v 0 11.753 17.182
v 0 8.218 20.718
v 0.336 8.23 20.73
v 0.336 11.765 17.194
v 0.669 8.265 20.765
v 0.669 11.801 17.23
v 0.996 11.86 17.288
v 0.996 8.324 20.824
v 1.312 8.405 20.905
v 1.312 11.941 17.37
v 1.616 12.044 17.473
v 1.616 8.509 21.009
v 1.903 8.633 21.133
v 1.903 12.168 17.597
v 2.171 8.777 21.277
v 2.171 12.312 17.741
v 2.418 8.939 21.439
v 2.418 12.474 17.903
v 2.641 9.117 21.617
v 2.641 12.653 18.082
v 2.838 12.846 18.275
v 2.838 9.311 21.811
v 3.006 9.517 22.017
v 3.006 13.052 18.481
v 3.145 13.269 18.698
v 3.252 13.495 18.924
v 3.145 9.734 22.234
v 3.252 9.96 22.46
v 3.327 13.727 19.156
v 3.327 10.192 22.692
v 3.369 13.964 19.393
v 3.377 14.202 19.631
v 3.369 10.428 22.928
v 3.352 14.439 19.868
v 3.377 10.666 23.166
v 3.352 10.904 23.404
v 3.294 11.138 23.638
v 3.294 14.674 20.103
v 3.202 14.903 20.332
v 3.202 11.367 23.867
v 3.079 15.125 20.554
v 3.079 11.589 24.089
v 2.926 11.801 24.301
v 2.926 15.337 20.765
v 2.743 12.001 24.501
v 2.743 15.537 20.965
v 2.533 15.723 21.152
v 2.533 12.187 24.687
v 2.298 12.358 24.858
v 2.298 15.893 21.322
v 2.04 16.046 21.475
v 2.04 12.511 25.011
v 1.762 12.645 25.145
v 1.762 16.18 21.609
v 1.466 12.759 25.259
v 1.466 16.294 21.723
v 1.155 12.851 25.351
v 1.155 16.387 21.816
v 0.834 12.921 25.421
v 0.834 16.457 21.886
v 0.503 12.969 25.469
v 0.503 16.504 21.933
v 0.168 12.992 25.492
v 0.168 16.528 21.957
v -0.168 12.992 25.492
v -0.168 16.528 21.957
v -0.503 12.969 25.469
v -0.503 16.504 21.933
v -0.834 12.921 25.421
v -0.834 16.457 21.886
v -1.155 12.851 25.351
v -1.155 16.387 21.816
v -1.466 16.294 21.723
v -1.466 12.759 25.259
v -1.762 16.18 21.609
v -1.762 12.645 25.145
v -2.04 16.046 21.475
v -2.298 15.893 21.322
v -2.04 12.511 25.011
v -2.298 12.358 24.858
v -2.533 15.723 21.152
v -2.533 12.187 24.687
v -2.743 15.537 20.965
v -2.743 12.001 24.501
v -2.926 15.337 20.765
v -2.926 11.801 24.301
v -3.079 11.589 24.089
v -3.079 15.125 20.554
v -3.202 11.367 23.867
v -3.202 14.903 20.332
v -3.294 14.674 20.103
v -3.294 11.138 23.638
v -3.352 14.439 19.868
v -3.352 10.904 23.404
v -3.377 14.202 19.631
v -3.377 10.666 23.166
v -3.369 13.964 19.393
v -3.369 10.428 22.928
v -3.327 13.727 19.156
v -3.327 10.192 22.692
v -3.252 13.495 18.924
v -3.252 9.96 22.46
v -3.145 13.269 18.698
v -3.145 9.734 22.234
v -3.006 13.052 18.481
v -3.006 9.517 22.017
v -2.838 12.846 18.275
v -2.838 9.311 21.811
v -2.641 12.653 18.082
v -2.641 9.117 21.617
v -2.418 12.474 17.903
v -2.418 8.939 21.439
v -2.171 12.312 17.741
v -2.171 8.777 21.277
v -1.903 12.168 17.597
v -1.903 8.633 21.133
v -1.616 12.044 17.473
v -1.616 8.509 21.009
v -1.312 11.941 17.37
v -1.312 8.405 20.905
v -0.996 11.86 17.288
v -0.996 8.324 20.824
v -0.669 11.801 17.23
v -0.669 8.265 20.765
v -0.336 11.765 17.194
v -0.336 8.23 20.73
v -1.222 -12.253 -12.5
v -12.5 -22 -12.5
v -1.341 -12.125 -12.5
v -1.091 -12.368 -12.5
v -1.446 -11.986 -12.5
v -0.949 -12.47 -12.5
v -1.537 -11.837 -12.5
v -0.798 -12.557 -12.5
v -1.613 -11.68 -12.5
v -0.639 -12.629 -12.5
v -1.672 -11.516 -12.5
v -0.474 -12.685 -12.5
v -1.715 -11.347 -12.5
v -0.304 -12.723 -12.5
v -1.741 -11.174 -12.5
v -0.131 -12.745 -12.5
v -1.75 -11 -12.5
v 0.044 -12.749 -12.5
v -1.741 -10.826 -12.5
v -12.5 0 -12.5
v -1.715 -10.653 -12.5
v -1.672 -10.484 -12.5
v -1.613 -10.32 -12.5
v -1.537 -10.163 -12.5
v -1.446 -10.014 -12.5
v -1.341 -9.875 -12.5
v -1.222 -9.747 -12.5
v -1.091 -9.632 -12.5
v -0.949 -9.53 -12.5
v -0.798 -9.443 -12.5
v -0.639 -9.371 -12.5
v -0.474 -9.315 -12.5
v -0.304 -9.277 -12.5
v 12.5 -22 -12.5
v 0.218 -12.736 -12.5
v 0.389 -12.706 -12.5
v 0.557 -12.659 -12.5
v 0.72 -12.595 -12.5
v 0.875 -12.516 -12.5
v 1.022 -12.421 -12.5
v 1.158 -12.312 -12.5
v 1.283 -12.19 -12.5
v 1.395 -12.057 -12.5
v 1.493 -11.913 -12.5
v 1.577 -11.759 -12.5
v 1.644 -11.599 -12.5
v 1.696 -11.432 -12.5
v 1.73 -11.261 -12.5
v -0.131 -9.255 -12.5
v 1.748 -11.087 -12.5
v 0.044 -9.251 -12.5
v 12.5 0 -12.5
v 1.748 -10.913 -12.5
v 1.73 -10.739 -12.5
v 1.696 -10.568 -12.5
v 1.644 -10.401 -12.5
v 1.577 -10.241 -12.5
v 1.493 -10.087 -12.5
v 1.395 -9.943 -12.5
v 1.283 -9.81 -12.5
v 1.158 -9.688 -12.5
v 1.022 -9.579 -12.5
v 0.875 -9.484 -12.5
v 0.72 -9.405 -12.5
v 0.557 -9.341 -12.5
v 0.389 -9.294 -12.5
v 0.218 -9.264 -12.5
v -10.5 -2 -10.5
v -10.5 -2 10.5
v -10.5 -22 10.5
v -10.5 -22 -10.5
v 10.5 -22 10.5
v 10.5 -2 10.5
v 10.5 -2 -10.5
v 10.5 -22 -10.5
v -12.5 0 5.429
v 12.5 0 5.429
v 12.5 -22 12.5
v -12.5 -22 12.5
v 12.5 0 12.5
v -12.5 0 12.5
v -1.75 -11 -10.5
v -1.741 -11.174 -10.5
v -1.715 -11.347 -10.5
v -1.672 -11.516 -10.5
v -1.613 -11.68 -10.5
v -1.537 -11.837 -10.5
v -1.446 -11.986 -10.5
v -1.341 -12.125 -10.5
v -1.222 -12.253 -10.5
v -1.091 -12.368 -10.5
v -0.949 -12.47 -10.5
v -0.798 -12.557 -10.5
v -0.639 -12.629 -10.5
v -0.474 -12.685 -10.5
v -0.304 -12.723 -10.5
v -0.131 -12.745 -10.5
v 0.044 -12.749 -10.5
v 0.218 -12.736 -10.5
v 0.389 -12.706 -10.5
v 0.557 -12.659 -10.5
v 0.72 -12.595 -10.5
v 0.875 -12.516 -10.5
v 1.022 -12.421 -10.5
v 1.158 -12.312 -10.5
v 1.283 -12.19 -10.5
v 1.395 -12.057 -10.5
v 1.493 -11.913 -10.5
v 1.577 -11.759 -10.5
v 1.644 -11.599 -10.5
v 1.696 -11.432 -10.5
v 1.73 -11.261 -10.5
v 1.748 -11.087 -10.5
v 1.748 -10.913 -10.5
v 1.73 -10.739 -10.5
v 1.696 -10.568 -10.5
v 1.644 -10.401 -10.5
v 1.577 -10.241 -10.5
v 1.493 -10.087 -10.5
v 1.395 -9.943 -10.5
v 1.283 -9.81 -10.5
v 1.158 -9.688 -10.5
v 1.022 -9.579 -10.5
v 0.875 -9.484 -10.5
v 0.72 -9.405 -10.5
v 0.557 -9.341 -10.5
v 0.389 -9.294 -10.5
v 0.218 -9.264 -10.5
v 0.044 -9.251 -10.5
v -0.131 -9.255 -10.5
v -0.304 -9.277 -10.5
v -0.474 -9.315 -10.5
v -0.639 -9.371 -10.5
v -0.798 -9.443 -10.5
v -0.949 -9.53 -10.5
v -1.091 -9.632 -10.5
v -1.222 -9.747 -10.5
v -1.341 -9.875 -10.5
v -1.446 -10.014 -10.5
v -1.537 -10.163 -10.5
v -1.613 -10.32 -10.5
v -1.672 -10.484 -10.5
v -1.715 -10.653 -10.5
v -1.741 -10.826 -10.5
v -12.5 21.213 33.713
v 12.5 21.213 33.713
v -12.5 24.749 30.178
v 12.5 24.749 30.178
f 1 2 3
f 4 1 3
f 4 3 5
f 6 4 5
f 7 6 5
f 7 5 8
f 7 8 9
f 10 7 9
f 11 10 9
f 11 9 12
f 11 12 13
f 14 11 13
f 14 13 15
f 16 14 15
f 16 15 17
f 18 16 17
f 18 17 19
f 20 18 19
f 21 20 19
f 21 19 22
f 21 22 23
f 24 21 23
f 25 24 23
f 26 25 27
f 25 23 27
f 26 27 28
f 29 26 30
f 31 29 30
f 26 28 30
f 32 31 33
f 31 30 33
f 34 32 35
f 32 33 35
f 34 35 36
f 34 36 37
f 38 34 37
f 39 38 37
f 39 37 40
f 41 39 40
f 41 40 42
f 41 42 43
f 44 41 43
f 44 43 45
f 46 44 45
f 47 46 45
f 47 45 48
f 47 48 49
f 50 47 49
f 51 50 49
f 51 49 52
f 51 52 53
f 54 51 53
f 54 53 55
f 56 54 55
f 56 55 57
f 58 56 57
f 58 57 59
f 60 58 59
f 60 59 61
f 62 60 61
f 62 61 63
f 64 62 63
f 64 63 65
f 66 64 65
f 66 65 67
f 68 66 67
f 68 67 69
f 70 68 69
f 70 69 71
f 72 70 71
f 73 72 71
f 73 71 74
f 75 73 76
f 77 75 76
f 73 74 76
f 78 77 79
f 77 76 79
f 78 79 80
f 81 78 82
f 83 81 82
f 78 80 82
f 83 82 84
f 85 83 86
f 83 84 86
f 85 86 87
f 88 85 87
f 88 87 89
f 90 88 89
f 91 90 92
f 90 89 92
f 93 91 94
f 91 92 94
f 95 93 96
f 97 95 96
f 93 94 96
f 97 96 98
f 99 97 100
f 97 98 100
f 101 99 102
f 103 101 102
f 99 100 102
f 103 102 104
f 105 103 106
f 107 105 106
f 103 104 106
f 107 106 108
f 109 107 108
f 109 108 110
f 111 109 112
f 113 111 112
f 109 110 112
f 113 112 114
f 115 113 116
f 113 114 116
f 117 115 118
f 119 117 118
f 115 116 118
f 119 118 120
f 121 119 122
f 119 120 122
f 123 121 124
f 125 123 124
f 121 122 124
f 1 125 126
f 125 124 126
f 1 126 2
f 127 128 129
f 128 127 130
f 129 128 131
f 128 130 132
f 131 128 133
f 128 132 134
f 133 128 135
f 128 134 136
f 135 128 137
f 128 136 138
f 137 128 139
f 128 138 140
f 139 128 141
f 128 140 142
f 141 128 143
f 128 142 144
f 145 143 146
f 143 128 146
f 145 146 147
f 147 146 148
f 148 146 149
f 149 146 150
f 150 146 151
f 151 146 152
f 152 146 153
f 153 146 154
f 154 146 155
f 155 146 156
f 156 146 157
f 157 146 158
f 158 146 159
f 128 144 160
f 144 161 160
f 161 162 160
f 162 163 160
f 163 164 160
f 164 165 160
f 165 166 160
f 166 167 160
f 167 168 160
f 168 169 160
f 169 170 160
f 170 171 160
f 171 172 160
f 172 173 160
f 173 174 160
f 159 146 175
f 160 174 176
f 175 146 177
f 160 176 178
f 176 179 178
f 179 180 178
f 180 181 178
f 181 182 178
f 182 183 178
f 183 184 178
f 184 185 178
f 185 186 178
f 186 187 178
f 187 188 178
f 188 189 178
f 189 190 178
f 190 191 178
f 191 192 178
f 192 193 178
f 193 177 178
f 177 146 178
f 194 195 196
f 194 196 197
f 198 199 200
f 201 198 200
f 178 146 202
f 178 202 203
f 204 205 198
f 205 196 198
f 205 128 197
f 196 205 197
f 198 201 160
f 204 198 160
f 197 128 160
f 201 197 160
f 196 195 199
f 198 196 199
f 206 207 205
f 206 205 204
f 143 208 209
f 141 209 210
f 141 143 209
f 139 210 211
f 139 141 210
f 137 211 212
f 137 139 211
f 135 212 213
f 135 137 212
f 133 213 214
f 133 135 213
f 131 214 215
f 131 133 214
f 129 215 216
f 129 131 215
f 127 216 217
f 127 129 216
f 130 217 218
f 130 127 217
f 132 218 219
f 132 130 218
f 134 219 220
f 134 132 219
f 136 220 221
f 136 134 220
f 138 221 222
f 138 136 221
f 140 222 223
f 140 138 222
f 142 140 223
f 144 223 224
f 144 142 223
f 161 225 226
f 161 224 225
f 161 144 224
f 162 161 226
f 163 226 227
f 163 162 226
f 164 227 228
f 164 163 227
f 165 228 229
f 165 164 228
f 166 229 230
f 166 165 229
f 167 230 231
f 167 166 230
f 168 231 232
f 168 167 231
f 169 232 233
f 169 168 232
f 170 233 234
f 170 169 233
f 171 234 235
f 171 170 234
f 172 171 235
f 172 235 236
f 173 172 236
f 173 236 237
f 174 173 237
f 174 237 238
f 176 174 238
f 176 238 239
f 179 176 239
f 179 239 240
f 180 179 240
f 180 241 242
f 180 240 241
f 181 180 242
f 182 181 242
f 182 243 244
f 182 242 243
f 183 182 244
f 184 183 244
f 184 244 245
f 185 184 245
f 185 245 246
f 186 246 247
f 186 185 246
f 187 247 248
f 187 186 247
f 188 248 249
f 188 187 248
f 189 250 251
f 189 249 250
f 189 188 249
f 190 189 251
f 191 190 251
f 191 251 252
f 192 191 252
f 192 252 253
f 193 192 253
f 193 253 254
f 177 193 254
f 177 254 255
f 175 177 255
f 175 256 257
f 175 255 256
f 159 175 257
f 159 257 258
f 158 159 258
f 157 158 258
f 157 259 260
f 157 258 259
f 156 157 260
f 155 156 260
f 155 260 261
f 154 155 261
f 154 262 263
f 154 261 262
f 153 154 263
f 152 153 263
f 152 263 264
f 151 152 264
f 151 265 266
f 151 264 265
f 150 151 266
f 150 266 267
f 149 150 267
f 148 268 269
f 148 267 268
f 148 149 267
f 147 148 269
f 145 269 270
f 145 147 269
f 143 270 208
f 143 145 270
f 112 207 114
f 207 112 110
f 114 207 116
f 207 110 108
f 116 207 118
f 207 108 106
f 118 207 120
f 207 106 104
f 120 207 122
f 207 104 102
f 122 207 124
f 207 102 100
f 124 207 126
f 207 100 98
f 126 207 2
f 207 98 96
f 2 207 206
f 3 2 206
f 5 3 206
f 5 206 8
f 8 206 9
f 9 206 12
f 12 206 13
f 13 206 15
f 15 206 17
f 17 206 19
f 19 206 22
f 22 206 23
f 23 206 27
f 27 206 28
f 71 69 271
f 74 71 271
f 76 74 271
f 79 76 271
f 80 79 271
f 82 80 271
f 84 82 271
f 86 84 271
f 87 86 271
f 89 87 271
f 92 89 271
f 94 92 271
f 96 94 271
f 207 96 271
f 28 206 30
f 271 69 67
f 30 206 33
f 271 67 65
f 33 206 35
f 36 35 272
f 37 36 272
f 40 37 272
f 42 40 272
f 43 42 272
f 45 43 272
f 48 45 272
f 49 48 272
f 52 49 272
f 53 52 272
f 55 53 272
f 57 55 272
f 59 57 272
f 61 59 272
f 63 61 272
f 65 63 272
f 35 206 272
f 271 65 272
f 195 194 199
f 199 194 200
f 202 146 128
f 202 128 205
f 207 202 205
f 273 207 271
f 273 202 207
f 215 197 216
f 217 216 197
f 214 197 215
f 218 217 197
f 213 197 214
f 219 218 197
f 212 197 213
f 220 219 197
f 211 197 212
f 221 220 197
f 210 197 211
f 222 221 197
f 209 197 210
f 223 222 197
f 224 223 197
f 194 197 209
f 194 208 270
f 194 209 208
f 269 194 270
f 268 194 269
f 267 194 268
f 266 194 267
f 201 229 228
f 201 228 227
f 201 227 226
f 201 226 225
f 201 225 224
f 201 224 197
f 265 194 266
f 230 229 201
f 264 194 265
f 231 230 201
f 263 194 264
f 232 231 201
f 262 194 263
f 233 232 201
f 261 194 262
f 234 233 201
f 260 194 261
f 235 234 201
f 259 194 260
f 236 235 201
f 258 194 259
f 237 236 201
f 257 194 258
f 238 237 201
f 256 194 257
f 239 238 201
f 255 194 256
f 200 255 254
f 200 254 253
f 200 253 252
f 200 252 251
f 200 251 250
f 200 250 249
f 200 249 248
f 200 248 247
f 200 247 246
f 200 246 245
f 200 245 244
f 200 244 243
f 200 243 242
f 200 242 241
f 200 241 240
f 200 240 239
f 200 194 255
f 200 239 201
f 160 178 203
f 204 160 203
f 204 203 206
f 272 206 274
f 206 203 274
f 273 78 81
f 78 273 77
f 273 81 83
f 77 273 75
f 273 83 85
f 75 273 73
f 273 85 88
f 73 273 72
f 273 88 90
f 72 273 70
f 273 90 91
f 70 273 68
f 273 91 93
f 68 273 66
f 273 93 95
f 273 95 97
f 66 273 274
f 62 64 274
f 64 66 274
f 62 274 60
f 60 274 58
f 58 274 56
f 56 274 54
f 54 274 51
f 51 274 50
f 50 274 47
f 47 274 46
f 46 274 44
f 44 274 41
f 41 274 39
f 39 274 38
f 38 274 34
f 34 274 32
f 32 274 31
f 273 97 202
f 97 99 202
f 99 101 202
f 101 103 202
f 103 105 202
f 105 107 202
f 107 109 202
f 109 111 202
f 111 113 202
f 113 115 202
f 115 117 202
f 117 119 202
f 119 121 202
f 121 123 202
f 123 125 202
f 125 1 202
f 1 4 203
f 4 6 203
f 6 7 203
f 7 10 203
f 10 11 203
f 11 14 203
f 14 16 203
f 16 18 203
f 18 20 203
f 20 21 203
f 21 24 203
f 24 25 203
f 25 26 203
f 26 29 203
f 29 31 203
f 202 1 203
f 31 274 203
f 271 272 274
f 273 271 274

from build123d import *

# Parameters (mm, degrees)
SKETCH1_W           = 25
SKETCH1_H           = 25
SKETCH1_W_2         = 21
SKETCH1_H_2         = 21
BOSS_EXTRUDE1_DEPTH = 2
BOSS_EXTRUDE2_START = -2
SKETCH1_3_W         = 25
SKETCH1_3_H         = 25
SKETCH1_3_W_2       = 21
SKETCH1_3_H_2       = 21
BOSS_EXTRUDE2_DEPTH = 20
CUT_EXTRUDE1_REACH  = 37.57
SKETCH2_R           = 1.75
BOSS_EXTRUDE3_START = 12.5
BOSS_EXTRUDE3_DEPTH = 25
SKETCH4_R           = 3.3782
CUT_EXTRUDE2_DEPTH  = 44.259672441


with BuildPart() as part:
    # Sketch1 → Boss-Extrude1 (new body)
    # profile 1 of 2: a face of its own
    with BuildSketch(Plane(origin=(0, 0, 0), x_dir=(1, 0, 0), z_dir=(0, 1, 0))):
        Rectangle(SKETCH1_W, SKETCH1_H)
        Rectangle(SKETCH1_W_2, SKETCH1_H_2, mode=Mode.SUBTRACT)
    # profile 2 of 2: a face of its own
    with BuildSketch(Plane(origin=(0, 0, 0), x_dir=(1, 0, 0), z_dir=(0, 1, 0))):
        Rectangle(SKETCH1_W_2, SKETCH1_H_2)
    extrude(amount=-BOSS_EXTRUDE1_DEPTH)

    # Sketch1<3> → Boss-Extrude2 (add)
    with BuildSketch(Plane(origin=(0, 0, 0), x_dir=(1, 0, 0), z_dir=(0, 1, 0)).offset(BOSS_EXTRUDE2_START)):
        Rectangle(SKETCH1_3_W, SKETCH1_3_H)
        Rectangle(SKETCH1_3_W_2, SKETCH1_3_H_2, mode=Mode.SUBTRACT)
    extrude(amount=-BOSS_EXTRUDE2_DEPTH)

    # Sketch2 → Cut-Extrude1 (cut, up to next)
    with BuildSketch(Plane.XY.offset(-12.5), mode=Mode.PRIVATE) as cut_extrude1_sk1:
        with Locations(Location((0, -11, 0), (0, 0, 180))):
            Circle(SKETCH2_R)
    cut_extrude1_tool1 = extrude(cut_extrude1_sk1.sketch, amount=CUT_EXTRUDE1_REACH, mode=Mode.PRIVATE) & part.part
    add(cut_extrude1_tool1.solids().sort_by_distance((0, -11, -12.5))[0], mode=Mode.SUBTRACT)

    # Sketch3 → Boss-Extrude3 (add, through all)
    with BuildSketch(Plane(origin=(0, 0, 0), x_dir=(0, 0, -1), z_dir=(1, 0, 0)).offset(BOSS_EXTRUDE3_START)):
        Polygon((-12.5, 0), (-33.713203436, 21.213203436), (-30.17766953, 24.748737342), (-5.428932188, 0), align=None)
    extrude(amount=-BOSS_EXTRUDE3_DEPTH)

    # Sketch4 → Cut-Extrude2 (cut, through all)
    with BuildSketch(Plane(origin=(0, -6.25, 6.25), x_dir=(1, 0, 0), z_dir=(0, -0.7071067811865467, 0.7071067811865485))):
        with Locations(Location((0, 23.838834765, 0), (0, 0, 270))):
            Circle(SKETCH4_R)
    extrude(amount=-CUT_EXTRUDE2_DEPTH, mode=Mode.SUBTRACT)


solid = part.part
